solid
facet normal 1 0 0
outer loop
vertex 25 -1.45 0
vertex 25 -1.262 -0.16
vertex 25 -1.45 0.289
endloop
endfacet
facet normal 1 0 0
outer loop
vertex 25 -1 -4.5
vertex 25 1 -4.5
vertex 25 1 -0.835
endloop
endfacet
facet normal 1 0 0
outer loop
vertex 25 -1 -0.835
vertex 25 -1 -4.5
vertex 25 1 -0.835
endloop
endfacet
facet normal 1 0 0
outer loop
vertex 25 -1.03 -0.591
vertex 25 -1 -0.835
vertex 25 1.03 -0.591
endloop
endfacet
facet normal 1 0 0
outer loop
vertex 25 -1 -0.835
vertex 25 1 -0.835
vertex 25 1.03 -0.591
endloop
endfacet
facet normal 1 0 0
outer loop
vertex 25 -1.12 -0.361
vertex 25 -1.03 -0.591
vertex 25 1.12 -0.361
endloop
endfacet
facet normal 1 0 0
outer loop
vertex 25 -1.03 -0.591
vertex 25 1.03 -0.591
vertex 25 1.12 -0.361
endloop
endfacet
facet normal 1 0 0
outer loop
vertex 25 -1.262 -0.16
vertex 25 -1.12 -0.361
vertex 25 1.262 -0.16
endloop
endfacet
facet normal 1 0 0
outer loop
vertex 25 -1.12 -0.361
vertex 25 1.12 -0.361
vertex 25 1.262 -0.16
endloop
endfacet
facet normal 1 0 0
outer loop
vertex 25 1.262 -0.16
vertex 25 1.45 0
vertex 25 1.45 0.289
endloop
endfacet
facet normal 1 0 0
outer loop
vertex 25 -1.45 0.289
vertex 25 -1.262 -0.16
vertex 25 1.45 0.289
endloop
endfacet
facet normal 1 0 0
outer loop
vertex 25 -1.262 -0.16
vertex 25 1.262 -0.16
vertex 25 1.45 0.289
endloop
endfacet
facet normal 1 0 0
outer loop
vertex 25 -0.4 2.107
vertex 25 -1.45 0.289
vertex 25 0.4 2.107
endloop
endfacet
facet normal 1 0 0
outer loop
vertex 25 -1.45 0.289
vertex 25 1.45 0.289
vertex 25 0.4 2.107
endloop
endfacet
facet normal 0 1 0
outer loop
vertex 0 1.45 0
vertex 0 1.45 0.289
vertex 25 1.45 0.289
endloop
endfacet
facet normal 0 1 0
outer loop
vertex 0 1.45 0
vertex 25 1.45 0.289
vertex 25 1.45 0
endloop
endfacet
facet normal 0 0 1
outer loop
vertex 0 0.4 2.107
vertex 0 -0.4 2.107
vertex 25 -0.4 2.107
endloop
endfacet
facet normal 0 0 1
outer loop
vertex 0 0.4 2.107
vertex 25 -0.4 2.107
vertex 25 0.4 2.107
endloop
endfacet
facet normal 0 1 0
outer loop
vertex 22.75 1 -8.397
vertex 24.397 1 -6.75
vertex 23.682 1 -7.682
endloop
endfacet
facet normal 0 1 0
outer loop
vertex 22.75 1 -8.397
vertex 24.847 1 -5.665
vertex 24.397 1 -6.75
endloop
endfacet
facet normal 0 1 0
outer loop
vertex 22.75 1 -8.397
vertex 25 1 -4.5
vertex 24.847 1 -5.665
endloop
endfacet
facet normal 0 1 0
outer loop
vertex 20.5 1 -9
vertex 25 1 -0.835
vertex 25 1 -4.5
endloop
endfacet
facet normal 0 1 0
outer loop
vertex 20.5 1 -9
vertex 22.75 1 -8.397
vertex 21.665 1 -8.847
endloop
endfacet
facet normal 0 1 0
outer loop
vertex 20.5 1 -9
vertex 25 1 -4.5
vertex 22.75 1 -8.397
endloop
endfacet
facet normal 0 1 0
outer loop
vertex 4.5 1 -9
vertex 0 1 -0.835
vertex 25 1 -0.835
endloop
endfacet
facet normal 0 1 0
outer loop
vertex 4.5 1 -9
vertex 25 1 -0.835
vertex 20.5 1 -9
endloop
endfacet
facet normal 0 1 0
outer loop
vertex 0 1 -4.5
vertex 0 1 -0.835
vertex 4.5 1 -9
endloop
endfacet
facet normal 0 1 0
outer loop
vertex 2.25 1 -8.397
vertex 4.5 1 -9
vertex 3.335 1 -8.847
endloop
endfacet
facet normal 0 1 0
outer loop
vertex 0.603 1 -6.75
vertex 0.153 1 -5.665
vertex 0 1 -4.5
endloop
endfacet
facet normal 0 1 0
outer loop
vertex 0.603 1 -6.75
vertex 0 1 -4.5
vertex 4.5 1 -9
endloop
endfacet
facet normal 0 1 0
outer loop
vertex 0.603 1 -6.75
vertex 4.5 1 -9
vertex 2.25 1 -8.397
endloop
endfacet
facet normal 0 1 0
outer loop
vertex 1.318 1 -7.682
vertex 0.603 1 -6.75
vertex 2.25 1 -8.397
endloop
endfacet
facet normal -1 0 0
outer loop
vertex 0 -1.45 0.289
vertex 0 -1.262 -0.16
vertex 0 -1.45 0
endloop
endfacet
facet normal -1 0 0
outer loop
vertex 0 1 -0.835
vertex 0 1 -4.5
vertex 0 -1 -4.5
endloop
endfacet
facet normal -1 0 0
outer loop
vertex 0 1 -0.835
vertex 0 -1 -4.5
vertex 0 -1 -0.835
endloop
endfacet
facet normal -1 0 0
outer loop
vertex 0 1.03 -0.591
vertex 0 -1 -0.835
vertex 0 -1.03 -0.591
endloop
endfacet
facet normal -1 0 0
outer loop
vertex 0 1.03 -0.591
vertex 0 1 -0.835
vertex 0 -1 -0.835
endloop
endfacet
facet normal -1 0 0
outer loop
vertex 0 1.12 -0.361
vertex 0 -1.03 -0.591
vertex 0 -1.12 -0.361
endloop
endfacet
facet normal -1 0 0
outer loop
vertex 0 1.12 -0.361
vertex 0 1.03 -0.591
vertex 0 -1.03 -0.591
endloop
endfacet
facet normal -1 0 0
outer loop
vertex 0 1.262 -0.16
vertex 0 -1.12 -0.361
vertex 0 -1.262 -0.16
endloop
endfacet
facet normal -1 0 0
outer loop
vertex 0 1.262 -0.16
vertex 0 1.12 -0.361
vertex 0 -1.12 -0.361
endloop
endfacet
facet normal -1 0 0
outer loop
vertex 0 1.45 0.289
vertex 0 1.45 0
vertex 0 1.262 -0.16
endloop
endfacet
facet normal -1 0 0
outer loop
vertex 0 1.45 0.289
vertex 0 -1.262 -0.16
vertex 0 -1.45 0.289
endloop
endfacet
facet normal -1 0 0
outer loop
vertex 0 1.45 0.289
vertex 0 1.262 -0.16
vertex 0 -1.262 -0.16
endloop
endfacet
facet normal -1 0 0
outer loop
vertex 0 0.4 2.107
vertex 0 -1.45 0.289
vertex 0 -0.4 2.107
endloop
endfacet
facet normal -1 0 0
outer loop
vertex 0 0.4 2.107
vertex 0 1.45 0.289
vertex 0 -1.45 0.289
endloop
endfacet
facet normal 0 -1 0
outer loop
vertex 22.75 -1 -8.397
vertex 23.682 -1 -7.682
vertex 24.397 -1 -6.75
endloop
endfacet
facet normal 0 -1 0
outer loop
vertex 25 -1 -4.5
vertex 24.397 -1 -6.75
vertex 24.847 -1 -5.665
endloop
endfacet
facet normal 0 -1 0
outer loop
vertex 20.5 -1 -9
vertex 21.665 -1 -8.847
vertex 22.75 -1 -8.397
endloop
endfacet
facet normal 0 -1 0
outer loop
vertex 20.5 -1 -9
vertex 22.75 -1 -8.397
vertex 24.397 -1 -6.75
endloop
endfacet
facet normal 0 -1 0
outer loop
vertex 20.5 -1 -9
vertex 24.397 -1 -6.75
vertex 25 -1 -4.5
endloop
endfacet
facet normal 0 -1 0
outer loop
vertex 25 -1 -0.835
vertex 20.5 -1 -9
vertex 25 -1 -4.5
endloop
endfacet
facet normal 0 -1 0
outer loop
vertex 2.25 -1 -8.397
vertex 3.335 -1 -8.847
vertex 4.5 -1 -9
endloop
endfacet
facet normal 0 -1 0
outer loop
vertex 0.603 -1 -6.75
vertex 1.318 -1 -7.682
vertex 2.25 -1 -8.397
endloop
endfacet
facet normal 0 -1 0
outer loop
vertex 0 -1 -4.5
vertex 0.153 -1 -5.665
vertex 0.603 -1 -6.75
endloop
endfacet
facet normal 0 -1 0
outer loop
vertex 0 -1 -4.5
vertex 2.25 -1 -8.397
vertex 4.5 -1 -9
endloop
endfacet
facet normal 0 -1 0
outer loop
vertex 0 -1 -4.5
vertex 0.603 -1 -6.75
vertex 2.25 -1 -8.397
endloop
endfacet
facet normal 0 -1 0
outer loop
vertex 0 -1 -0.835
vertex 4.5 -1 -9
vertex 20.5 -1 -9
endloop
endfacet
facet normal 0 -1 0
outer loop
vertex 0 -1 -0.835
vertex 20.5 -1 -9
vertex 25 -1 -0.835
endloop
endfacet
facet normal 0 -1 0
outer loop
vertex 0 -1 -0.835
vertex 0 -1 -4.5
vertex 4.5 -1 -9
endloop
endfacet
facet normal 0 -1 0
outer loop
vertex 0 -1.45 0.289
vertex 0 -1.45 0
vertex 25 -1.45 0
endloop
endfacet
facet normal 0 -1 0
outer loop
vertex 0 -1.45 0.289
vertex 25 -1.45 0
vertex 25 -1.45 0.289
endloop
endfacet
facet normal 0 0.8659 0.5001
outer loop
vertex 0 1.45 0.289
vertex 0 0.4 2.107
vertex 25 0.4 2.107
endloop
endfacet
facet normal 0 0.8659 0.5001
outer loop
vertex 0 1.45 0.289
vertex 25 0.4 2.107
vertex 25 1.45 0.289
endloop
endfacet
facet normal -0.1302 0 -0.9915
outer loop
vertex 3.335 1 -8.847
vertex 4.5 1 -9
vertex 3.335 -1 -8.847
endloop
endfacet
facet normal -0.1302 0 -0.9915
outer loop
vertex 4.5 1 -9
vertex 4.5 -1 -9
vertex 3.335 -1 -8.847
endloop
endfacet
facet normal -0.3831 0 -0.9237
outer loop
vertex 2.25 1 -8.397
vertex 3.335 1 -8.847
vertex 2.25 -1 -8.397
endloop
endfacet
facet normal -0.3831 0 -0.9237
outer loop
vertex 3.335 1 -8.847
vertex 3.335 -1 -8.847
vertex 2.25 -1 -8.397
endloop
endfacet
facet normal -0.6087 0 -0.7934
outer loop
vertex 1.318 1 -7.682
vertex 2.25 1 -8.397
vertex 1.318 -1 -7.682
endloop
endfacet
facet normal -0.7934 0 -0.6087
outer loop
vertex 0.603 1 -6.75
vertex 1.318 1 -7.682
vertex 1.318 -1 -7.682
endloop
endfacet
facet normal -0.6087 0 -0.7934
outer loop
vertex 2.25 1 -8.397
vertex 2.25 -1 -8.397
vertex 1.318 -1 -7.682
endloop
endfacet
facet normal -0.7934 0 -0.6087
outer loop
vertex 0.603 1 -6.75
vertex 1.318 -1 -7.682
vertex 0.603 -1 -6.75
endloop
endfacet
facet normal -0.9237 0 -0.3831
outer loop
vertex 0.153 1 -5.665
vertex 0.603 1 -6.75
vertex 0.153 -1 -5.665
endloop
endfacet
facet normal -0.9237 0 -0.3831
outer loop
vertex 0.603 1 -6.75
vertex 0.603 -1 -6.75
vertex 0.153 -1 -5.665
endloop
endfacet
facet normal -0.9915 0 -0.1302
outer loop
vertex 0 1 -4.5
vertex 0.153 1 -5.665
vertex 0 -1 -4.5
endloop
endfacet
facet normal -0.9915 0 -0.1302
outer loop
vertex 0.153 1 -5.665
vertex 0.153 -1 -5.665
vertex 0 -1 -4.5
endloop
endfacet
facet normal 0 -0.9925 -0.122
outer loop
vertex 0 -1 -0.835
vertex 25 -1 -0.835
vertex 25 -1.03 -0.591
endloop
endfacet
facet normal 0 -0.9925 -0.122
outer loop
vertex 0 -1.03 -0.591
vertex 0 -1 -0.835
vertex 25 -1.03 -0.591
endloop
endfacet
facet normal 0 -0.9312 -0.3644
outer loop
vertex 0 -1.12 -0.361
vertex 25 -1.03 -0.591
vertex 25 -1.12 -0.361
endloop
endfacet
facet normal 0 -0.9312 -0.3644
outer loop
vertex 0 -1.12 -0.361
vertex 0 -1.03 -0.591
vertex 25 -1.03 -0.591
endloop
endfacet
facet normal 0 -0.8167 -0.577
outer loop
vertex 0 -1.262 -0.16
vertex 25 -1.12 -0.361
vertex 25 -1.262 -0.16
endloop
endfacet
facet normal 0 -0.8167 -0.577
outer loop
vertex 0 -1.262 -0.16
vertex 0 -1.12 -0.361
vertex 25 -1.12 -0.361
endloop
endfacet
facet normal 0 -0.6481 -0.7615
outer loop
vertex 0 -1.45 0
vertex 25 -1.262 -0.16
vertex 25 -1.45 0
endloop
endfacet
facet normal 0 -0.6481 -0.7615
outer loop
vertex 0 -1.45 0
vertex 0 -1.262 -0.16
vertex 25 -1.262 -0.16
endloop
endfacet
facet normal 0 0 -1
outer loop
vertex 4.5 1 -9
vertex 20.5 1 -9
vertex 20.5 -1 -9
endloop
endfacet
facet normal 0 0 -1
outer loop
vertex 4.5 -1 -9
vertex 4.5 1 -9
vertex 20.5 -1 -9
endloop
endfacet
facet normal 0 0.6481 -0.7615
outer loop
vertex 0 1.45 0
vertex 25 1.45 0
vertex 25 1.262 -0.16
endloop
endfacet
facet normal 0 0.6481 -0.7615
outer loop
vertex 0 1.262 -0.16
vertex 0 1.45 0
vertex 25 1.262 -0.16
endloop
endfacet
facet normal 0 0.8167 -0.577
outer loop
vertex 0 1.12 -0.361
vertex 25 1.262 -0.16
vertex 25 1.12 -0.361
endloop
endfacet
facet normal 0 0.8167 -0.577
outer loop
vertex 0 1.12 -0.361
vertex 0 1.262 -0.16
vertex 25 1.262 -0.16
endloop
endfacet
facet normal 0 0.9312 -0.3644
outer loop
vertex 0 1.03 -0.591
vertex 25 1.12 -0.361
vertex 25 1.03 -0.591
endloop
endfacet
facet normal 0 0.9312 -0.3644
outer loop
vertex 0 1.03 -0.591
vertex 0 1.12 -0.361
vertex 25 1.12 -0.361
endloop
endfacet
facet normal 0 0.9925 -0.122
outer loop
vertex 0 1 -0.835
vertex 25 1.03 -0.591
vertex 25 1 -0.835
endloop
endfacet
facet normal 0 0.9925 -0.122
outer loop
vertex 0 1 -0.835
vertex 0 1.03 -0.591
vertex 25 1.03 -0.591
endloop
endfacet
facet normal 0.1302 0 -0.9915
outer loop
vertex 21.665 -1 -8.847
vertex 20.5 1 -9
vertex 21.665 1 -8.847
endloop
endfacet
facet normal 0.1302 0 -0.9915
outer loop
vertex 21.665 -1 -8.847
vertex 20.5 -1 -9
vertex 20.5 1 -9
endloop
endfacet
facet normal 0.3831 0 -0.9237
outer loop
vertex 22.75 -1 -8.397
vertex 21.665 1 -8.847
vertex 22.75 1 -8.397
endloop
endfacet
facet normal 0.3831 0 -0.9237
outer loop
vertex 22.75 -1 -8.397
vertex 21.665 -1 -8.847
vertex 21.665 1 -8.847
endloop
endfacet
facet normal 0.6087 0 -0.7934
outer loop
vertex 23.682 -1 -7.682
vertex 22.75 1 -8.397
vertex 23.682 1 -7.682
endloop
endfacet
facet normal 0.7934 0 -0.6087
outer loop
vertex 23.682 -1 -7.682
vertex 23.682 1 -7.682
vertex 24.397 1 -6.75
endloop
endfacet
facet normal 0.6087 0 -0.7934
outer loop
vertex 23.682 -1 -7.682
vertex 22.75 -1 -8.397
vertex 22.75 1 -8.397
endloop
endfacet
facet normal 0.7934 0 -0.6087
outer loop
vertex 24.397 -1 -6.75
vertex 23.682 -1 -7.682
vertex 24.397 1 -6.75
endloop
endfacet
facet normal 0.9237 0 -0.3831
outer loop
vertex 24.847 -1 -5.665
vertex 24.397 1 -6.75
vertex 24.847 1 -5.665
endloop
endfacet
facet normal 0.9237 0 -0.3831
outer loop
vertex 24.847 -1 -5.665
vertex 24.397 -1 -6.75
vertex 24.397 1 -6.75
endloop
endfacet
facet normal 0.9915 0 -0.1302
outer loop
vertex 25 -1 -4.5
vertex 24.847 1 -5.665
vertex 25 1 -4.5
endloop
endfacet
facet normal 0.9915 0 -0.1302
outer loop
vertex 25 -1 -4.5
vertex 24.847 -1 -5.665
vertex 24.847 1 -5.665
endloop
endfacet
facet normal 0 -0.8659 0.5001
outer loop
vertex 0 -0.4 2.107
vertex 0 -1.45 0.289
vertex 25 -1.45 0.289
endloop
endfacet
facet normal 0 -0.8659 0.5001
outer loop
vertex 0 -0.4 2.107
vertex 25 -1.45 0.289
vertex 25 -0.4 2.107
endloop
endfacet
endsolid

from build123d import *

# Parameters (mm, degrees)
CONNECTION_EXTRUDE_DEPTH = 25
TOP_FILLETS_R            = 4.5
CONNECTION_FILLETS_R     = 1


with BuildPart() as part:
    # Connection Sketch → Connection Extrude (new body)
    with BuildSketch(Plane(origin=(0, 0, 0), x_dir=(0, 0, -1), z_dir=(1, 0, 0))):
        Polygon((0, 1.45), (0, 1), (9, 1), (9, -1), (0, -1), (0, -1.45), (-0.288526329, -1.45), (-2.107179677, -0.4), (-2.107179677, 0.4), (-0.288526329, 1.45), align=None)
    extrude(amount=CONNECTION_EXTRUDE_DEPTH)

    # Top Fillets
    top_fillets_edges = [part.edges().sort_by_distance(p)[0] for p in [
        (0, 0, -9),
        (25, 0, -9),
    ]]
    fillet(top_fillets_edges, radius=TOP_FILLETS_R)

    # Connection Fillets
    # the kernel refuses this fillet: 1 mm, written as the material it adds along each edge
    with BuildSketch(Plane(origin=(0, 1, 0), x_dir=(0, 0, -1), z_dir=(1, 0, 0))) as connection_fillets_piece_1:
        with BuildLine():
            CenterArc((0.835164654, 1), CONNECTION_FILLETS_R, 213.367012969, 56.632987031)
            Line((0, 0.45), (-0.016703293, 0.439))
            ThreePointArc((-0.016703293, 0.439), (-0.02, 0.225), (-0.02, 0))
            Line((-0.02, 0), (0, -0.02))
            Line((0, -0.02), (0.835164654, -0.02))
            Line((0.835164654, -0.02), (0.835164654, 0))
        make_face()
    extrude(amount=25)
    with BuildSketch(Plane(origin=(0, -1, 0), x_dir=(0, 0, -1), z_dir=(1, 0, 0))) as connection_fillets_piece_2:
        with BuildLine():
            CenterArc((0.835164654, -1), CONNECTION_FILLETS_R, 90, 56.632987031)
            Line((0, -0.45), (-0.016703293, -0.439))
            ThreePointArc((-0.016703293, -0.439), (-0.02, -0.225), (-0.02, 0))
            Line((-0.02, 0), (0, 0.02))
            Line((0, 0.02), (0.835164654, 0.02))
            Line((0.835164654, 0.02), (0.835164654, 0))
        make_face()
    extrude(amount=25)


solid = part.part
